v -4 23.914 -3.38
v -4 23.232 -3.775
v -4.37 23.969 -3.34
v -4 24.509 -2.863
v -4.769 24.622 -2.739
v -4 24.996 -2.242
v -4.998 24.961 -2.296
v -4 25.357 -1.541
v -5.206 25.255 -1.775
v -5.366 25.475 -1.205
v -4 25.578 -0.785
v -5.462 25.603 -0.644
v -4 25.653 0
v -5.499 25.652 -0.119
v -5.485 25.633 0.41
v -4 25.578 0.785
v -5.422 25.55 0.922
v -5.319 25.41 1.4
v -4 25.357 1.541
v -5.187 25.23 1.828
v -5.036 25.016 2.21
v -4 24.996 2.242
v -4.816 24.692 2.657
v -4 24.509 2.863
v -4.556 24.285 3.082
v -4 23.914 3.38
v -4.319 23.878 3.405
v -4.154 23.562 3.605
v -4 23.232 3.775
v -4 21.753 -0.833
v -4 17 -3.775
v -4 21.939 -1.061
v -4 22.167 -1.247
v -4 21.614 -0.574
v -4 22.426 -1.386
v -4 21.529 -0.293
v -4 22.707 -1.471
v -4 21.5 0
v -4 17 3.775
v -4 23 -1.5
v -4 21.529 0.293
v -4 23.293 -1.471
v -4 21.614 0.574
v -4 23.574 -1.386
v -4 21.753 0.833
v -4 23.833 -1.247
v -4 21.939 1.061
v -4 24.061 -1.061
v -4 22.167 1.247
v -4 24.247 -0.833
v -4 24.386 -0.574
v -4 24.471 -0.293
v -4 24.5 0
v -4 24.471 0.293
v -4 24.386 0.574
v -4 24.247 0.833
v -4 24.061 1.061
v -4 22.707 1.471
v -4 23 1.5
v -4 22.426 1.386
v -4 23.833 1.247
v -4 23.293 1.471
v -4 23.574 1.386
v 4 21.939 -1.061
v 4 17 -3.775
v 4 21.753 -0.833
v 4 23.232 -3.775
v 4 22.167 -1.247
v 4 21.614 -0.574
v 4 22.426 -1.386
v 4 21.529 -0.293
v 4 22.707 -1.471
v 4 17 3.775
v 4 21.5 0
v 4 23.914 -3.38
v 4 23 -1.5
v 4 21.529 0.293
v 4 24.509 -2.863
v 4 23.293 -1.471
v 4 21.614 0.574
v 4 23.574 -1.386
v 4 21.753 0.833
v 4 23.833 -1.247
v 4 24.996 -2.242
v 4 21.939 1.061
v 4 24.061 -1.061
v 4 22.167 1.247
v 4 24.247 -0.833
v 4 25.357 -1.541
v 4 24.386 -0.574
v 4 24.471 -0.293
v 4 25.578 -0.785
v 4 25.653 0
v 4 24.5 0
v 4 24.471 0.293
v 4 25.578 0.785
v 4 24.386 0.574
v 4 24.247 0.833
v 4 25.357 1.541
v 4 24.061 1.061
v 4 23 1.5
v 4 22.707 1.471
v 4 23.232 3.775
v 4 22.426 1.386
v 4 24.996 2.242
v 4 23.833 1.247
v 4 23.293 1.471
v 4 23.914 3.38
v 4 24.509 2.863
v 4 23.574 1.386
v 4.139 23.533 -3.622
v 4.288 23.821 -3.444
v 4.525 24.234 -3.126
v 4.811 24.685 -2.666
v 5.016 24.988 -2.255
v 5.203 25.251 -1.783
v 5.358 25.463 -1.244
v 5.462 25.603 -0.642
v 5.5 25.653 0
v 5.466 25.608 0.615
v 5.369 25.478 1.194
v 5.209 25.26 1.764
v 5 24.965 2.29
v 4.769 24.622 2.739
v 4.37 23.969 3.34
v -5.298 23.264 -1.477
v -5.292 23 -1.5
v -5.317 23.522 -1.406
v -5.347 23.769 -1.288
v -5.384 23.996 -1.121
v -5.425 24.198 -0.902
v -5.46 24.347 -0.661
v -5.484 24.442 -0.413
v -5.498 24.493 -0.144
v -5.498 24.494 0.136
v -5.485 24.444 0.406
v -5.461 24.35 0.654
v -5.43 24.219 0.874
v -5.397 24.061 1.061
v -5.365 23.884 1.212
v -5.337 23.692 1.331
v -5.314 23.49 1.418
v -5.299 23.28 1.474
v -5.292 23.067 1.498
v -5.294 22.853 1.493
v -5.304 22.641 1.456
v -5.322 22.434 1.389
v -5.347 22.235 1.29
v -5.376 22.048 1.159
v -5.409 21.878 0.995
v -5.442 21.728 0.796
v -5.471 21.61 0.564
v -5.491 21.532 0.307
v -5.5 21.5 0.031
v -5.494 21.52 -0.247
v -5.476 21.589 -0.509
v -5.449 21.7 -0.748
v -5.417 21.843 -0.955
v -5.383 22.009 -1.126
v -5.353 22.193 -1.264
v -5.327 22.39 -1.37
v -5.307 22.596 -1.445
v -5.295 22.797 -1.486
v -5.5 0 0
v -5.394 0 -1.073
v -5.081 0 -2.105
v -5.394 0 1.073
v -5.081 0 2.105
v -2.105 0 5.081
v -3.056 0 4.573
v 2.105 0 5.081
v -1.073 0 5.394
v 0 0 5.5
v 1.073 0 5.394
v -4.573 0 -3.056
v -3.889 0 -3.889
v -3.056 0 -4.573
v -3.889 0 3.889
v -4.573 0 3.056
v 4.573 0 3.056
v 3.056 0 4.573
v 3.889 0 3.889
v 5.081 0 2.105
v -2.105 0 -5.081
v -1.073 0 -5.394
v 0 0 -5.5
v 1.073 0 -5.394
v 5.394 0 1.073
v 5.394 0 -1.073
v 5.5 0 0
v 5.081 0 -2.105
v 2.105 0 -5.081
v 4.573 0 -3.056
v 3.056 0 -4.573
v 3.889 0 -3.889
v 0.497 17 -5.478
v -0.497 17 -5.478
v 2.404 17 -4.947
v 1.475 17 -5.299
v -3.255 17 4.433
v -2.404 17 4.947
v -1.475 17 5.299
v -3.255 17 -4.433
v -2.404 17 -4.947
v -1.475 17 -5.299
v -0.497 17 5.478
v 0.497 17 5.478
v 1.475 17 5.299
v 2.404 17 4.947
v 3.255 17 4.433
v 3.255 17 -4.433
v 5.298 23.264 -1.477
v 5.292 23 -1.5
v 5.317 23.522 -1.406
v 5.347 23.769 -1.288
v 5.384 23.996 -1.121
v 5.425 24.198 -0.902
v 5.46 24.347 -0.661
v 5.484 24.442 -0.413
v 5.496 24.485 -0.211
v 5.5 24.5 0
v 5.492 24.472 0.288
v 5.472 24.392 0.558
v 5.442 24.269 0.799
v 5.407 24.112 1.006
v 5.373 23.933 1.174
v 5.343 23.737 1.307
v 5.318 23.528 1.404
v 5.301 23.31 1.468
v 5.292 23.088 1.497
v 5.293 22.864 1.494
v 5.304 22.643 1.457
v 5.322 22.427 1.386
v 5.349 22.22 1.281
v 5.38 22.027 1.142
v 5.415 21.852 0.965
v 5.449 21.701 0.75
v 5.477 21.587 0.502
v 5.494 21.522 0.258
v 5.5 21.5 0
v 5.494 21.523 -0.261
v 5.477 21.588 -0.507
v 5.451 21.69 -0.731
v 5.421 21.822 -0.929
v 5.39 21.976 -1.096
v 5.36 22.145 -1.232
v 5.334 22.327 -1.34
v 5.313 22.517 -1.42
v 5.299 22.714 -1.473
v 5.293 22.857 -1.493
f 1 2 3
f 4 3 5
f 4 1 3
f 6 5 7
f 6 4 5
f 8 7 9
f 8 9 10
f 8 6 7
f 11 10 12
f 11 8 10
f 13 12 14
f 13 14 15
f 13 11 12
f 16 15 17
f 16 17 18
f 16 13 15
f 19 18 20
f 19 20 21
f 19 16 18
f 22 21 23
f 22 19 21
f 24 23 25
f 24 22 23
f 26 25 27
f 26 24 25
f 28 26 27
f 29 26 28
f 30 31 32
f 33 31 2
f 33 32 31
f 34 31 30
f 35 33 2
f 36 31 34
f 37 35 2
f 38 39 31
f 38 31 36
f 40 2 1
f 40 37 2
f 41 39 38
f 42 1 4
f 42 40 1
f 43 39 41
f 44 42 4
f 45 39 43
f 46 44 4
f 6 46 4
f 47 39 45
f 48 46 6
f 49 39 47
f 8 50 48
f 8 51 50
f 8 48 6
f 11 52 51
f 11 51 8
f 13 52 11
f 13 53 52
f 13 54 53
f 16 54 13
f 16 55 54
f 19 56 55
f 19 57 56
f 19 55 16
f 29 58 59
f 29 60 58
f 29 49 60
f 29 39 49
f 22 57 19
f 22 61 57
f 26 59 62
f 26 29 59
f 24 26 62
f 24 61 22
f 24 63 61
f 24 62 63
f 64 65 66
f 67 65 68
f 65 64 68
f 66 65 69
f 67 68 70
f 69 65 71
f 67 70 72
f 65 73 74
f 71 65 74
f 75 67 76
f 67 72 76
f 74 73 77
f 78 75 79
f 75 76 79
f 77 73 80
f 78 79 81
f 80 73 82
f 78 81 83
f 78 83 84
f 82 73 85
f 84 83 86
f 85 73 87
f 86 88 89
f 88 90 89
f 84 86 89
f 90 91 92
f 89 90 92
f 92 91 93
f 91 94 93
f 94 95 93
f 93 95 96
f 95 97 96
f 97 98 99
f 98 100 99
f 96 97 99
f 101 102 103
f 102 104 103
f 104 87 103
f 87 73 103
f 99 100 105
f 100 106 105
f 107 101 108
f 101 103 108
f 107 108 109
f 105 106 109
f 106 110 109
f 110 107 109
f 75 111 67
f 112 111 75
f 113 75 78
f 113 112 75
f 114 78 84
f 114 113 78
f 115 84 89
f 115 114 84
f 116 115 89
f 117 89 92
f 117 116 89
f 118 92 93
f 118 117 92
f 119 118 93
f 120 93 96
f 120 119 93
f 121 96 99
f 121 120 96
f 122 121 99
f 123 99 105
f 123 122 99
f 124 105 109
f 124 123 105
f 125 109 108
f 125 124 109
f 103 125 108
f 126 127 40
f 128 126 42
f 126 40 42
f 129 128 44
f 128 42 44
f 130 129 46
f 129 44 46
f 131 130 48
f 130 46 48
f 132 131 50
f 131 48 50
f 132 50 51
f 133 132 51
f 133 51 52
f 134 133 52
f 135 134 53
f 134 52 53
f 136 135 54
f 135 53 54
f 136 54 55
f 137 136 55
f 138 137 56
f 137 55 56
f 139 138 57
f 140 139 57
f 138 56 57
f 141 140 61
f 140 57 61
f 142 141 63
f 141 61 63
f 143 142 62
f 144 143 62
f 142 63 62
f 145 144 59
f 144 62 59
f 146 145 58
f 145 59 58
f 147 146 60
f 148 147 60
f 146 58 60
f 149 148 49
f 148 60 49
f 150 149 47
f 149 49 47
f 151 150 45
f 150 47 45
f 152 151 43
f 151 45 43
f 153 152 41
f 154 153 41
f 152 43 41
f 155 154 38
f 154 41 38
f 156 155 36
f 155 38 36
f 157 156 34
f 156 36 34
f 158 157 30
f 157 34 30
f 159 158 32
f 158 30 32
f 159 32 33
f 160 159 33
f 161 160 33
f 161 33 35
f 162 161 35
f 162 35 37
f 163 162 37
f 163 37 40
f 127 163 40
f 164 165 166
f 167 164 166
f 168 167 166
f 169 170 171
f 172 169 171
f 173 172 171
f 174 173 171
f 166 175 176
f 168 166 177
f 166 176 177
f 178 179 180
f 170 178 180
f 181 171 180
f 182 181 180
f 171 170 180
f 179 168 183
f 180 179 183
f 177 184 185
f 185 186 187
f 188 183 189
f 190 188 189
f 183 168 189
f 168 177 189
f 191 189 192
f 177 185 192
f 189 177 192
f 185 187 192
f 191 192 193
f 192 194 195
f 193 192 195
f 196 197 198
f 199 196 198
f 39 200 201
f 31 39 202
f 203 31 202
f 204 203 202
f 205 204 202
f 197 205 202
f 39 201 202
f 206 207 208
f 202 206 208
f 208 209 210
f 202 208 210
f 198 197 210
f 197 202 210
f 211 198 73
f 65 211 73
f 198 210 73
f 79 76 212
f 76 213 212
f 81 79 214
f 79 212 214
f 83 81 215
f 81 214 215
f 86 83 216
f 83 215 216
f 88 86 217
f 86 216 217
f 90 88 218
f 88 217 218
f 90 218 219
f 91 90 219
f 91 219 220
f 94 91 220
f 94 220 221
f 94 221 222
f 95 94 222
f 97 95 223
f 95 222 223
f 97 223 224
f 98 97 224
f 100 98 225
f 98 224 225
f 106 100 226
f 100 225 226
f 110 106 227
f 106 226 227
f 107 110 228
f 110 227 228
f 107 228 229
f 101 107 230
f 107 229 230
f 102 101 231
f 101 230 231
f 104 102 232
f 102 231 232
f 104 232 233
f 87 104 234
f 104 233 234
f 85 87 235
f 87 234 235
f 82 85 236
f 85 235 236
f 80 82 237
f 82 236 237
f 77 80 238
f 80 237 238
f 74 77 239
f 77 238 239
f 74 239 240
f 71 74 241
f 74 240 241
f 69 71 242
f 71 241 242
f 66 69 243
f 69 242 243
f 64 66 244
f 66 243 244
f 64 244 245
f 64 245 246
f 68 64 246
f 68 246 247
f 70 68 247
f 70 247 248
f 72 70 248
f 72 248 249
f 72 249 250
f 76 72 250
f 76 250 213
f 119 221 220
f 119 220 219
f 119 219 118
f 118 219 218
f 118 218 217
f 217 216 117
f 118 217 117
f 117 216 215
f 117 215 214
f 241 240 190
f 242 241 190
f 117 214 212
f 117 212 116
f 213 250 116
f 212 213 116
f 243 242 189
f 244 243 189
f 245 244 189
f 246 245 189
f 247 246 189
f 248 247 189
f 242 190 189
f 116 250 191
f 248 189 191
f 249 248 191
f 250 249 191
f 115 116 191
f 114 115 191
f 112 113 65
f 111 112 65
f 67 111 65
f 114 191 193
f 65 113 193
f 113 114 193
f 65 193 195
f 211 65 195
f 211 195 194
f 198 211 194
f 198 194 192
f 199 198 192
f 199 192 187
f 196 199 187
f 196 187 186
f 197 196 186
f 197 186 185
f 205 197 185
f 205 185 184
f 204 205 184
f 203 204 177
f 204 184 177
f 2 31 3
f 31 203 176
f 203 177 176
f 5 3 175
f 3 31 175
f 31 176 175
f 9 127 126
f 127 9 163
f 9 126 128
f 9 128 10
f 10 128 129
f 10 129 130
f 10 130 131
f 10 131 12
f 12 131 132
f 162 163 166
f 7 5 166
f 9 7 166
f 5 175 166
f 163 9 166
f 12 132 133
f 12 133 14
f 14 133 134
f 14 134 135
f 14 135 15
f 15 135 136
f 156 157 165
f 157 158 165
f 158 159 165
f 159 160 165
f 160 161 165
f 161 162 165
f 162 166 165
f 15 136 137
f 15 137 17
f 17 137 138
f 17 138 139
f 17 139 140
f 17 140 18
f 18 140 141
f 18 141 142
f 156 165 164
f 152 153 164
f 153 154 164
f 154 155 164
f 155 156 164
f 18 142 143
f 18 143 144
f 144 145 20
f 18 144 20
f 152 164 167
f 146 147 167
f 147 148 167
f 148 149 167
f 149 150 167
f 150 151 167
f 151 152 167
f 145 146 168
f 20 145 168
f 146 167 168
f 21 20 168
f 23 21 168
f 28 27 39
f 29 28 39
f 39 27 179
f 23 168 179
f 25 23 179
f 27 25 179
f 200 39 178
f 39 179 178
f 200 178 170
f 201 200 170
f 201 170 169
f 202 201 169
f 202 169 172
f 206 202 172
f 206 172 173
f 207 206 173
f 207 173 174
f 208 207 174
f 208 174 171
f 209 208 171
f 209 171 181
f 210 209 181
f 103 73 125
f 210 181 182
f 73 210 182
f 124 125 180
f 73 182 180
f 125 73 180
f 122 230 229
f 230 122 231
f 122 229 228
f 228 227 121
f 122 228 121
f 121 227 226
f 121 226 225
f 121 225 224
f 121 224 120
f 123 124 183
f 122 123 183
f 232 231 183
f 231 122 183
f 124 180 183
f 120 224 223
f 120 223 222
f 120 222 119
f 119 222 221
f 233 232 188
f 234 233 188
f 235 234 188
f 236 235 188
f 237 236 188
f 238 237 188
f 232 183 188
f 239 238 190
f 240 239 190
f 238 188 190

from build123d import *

# Parameters (mm, degrees)
SKETCH_1_R          = 5.5
EXTRUDE_1_DEPTH     = 26
SKETCH_2_W          = 8
SKETCH_2_H          = 18
CUT_EXTRUDE_1_DEPTH = 25
SKETCH_3_R          = 1.5
CUT_EXTRUDE_2_DEPTH = 25
CUT_EXTRUDE_3_DEPTH = 11


with BuildPart() as part:
    # 草图1 → 凸台-拉伸1 (new body)
    with BuildSketch(Plane(origin=(0, 0, 0), x_dir=(1, 0, 0), z_dir=(0, 1, 0))):
        Circle(SKETCH_1_R)
    extrude(amount=EXTRUDE_1_DEPTH)

    # 草图2 → 切除-拉伸1 (cut, symmetric)
    with BuildSketch(Plane.XY):
        with Locations((0, 26)):
            Rectangle(SKETCH_2_W, SKETCH_2_H)
    extrude(amount=CUT_EXTRUDE_1_DEPTH, both=True, mode=Mode.SUBTRACT)

    # 草图3 → 切除-拉伸2 (cut, symmetric)
    with BuildSketch(Plane(origin=(-4, 0, 0), x_dir=(0, 0, -1), z_dir=(1, 0, 0))):
        with Locations((0, 23)):
            Circle(SKETCH_3_R)
    extrude(amount=CUT_EXTRUDE_2_DEPTH, both=True, mode=Mode.SUBTRACT)

    # 草图5 → 切除-拉伸3 (cut, symmetric)
    with BuildSketch(Plane(origin=(0, 0, 0), x_dir=(0, 0, -1), z_dir=(1, 0, 0))):
        with BuildLine():
            Line((-4.153311931, 21.5), (-12.215121886, 24.91830584))
            Line((-12.215121886, 24.91830584), (0.629850505, 32.78071868))
            Line((0.629850505, 32.78071868), (12.991410006, 24.598657791))
            Line((12.991410006, 24.598657791), (4.153311931, 21.5))
            ThreePointArc((4.153311931, 21.5), (0, 25.653311931), (-4.153311931, 21.5))
        make_face()
    extrude(amount=CUT_EXTRUDE_3_DEPTH, both=True, mode=Mode.SUBTRACT)


solid = part.part
